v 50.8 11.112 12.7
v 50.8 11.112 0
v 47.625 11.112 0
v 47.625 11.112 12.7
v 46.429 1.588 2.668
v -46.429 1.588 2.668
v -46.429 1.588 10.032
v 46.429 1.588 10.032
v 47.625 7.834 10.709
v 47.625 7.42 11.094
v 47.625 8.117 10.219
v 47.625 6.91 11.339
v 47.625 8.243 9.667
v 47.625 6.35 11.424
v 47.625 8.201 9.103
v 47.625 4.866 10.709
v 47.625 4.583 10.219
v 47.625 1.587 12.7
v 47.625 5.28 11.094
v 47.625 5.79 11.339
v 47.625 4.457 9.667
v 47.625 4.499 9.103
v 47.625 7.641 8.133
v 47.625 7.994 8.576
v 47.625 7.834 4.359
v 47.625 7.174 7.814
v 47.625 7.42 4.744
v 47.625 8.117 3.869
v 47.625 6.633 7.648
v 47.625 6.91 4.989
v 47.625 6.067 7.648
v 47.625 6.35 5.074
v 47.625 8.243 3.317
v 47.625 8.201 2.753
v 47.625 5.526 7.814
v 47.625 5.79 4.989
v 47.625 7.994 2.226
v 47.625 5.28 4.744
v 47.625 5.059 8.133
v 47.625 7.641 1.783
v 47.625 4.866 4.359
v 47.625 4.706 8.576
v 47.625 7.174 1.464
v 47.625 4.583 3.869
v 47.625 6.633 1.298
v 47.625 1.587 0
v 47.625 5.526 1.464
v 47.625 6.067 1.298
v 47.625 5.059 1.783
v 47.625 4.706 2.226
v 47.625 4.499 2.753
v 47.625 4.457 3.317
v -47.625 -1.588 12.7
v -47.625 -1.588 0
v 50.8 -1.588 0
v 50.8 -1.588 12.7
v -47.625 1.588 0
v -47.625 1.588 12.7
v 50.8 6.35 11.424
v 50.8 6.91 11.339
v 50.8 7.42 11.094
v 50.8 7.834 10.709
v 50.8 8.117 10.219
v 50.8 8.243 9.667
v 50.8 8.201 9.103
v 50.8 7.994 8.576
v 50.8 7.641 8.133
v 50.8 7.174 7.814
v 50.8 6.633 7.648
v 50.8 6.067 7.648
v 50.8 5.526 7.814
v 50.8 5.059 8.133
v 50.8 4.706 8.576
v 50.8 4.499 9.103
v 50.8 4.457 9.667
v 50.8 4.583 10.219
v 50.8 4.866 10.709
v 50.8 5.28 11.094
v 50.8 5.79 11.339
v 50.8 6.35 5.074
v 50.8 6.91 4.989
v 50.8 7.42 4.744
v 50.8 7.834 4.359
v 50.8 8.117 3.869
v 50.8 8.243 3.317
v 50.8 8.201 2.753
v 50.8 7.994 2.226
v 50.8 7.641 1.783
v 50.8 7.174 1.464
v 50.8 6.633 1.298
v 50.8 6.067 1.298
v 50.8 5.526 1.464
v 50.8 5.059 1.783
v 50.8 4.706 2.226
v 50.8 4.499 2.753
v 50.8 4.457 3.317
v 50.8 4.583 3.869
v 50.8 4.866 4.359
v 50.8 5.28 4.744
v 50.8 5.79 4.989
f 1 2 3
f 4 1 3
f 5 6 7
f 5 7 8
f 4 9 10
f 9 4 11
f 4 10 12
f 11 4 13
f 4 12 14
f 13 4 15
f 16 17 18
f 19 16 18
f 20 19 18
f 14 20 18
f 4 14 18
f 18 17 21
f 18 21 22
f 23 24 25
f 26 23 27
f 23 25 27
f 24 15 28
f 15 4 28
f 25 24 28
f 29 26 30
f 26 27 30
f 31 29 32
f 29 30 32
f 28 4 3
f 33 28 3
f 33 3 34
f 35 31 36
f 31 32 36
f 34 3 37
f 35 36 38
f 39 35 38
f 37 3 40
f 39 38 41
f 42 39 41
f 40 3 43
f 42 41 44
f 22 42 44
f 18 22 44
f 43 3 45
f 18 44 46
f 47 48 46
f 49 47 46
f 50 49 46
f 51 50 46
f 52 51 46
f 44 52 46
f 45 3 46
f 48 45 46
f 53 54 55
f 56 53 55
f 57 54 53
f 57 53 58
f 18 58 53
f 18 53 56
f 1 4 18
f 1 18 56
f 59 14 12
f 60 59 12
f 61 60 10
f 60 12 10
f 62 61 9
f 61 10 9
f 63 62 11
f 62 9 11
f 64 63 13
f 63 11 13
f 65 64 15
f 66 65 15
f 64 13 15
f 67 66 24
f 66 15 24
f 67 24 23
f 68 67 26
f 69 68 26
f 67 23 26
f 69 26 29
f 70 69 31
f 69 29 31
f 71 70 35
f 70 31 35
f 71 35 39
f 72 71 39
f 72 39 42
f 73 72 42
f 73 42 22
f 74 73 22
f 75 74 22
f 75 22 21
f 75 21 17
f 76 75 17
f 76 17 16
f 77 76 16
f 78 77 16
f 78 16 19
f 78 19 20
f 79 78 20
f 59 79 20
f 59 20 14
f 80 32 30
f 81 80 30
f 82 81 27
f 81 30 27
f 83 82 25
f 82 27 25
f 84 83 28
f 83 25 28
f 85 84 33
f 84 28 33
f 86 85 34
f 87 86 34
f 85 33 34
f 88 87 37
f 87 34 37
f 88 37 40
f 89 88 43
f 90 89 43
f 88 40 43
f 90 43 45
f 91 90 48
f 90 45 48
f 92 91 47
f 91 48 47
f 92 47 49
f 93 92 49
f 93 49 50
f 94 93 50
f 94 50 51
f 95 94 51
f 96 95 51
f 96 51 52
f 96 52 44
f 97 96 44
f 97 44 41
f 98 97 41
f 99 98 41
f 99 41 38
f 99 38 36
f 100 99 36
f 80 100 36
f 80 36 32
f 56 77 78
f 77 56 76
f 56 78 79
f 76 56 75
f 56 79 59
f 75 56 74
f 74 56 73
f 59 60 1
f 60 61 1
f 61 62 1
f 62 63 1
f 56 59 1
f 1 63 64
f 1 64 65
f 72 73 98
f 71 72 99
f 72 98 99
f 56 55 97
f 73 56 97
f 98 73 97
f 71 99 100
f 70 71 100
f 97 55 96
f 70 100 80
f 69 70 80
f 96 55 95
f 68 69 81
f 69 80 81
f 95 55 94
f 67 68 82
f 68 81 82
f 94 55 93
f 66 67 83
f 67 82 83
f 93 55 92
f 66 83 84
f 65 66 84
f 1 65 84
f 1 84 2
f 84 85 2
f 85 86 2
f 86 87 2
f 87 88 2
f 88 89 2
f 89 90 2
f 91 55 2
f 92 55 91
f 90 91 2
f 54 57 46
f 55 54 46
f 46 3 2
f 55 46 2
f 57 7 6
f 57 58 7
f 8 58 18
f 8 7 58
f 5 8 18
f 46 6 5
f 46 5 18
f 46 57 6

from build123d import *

# Parameters (mm, degrees)
BOSS_EXTRUDE1_DEPTH = 12.7
SKETCH2_R           = 1.89865
CUT_EXTRUDE1_DEPTH  = 12.7
SKETCH3_W           = 92.857106726
SKETCH3_H           = 7.363806504
BOSS_EXTRUDE2_DEPTH = 0.000254


with BuildPart() as part:
    # Sketch1 → Boss-Extrude1 (new body)
    with BuildSketch(Plane.XY):
        Polygon((-47.625, -1.5875), (50.8, -1.5875), (50.8, 11.1125), (47.625, 11.1125), (47.625, 1.5875), (-47.625, 1.5875), align=None)
    extrude(amount=BOSS_EXTRUDE1_DEPTH)

    # Sketch2 → Cut-Extrude1 (cut)
    with BuildSketch(Plane.ZY.offset(-47.625)):
        with Locations((3.175, 6.35)):
            Circle(SKETCH2_R)
        with Locations((9.525, 6.35)):
            Circle(SKETCH2_R)
    extrude(amount=-CUT_EXTRUDE1_DEPTH, mode=Mode.SUBTRACT)

    # Sketch3 → Boss-Extrude2 (add)
    with BuildSketch(Plane(origin=(0, 1.5875, 0), x_dir=(1, 0, 0), z_dir=(0, 1, 0))):
        with Locations((0, -6.35)):
            Rectangle(SKETCH3_W, SKETCH3_H)
    extrude(amount=BOSS_EXTRUDE2_DEPTH)


solid = part.part
